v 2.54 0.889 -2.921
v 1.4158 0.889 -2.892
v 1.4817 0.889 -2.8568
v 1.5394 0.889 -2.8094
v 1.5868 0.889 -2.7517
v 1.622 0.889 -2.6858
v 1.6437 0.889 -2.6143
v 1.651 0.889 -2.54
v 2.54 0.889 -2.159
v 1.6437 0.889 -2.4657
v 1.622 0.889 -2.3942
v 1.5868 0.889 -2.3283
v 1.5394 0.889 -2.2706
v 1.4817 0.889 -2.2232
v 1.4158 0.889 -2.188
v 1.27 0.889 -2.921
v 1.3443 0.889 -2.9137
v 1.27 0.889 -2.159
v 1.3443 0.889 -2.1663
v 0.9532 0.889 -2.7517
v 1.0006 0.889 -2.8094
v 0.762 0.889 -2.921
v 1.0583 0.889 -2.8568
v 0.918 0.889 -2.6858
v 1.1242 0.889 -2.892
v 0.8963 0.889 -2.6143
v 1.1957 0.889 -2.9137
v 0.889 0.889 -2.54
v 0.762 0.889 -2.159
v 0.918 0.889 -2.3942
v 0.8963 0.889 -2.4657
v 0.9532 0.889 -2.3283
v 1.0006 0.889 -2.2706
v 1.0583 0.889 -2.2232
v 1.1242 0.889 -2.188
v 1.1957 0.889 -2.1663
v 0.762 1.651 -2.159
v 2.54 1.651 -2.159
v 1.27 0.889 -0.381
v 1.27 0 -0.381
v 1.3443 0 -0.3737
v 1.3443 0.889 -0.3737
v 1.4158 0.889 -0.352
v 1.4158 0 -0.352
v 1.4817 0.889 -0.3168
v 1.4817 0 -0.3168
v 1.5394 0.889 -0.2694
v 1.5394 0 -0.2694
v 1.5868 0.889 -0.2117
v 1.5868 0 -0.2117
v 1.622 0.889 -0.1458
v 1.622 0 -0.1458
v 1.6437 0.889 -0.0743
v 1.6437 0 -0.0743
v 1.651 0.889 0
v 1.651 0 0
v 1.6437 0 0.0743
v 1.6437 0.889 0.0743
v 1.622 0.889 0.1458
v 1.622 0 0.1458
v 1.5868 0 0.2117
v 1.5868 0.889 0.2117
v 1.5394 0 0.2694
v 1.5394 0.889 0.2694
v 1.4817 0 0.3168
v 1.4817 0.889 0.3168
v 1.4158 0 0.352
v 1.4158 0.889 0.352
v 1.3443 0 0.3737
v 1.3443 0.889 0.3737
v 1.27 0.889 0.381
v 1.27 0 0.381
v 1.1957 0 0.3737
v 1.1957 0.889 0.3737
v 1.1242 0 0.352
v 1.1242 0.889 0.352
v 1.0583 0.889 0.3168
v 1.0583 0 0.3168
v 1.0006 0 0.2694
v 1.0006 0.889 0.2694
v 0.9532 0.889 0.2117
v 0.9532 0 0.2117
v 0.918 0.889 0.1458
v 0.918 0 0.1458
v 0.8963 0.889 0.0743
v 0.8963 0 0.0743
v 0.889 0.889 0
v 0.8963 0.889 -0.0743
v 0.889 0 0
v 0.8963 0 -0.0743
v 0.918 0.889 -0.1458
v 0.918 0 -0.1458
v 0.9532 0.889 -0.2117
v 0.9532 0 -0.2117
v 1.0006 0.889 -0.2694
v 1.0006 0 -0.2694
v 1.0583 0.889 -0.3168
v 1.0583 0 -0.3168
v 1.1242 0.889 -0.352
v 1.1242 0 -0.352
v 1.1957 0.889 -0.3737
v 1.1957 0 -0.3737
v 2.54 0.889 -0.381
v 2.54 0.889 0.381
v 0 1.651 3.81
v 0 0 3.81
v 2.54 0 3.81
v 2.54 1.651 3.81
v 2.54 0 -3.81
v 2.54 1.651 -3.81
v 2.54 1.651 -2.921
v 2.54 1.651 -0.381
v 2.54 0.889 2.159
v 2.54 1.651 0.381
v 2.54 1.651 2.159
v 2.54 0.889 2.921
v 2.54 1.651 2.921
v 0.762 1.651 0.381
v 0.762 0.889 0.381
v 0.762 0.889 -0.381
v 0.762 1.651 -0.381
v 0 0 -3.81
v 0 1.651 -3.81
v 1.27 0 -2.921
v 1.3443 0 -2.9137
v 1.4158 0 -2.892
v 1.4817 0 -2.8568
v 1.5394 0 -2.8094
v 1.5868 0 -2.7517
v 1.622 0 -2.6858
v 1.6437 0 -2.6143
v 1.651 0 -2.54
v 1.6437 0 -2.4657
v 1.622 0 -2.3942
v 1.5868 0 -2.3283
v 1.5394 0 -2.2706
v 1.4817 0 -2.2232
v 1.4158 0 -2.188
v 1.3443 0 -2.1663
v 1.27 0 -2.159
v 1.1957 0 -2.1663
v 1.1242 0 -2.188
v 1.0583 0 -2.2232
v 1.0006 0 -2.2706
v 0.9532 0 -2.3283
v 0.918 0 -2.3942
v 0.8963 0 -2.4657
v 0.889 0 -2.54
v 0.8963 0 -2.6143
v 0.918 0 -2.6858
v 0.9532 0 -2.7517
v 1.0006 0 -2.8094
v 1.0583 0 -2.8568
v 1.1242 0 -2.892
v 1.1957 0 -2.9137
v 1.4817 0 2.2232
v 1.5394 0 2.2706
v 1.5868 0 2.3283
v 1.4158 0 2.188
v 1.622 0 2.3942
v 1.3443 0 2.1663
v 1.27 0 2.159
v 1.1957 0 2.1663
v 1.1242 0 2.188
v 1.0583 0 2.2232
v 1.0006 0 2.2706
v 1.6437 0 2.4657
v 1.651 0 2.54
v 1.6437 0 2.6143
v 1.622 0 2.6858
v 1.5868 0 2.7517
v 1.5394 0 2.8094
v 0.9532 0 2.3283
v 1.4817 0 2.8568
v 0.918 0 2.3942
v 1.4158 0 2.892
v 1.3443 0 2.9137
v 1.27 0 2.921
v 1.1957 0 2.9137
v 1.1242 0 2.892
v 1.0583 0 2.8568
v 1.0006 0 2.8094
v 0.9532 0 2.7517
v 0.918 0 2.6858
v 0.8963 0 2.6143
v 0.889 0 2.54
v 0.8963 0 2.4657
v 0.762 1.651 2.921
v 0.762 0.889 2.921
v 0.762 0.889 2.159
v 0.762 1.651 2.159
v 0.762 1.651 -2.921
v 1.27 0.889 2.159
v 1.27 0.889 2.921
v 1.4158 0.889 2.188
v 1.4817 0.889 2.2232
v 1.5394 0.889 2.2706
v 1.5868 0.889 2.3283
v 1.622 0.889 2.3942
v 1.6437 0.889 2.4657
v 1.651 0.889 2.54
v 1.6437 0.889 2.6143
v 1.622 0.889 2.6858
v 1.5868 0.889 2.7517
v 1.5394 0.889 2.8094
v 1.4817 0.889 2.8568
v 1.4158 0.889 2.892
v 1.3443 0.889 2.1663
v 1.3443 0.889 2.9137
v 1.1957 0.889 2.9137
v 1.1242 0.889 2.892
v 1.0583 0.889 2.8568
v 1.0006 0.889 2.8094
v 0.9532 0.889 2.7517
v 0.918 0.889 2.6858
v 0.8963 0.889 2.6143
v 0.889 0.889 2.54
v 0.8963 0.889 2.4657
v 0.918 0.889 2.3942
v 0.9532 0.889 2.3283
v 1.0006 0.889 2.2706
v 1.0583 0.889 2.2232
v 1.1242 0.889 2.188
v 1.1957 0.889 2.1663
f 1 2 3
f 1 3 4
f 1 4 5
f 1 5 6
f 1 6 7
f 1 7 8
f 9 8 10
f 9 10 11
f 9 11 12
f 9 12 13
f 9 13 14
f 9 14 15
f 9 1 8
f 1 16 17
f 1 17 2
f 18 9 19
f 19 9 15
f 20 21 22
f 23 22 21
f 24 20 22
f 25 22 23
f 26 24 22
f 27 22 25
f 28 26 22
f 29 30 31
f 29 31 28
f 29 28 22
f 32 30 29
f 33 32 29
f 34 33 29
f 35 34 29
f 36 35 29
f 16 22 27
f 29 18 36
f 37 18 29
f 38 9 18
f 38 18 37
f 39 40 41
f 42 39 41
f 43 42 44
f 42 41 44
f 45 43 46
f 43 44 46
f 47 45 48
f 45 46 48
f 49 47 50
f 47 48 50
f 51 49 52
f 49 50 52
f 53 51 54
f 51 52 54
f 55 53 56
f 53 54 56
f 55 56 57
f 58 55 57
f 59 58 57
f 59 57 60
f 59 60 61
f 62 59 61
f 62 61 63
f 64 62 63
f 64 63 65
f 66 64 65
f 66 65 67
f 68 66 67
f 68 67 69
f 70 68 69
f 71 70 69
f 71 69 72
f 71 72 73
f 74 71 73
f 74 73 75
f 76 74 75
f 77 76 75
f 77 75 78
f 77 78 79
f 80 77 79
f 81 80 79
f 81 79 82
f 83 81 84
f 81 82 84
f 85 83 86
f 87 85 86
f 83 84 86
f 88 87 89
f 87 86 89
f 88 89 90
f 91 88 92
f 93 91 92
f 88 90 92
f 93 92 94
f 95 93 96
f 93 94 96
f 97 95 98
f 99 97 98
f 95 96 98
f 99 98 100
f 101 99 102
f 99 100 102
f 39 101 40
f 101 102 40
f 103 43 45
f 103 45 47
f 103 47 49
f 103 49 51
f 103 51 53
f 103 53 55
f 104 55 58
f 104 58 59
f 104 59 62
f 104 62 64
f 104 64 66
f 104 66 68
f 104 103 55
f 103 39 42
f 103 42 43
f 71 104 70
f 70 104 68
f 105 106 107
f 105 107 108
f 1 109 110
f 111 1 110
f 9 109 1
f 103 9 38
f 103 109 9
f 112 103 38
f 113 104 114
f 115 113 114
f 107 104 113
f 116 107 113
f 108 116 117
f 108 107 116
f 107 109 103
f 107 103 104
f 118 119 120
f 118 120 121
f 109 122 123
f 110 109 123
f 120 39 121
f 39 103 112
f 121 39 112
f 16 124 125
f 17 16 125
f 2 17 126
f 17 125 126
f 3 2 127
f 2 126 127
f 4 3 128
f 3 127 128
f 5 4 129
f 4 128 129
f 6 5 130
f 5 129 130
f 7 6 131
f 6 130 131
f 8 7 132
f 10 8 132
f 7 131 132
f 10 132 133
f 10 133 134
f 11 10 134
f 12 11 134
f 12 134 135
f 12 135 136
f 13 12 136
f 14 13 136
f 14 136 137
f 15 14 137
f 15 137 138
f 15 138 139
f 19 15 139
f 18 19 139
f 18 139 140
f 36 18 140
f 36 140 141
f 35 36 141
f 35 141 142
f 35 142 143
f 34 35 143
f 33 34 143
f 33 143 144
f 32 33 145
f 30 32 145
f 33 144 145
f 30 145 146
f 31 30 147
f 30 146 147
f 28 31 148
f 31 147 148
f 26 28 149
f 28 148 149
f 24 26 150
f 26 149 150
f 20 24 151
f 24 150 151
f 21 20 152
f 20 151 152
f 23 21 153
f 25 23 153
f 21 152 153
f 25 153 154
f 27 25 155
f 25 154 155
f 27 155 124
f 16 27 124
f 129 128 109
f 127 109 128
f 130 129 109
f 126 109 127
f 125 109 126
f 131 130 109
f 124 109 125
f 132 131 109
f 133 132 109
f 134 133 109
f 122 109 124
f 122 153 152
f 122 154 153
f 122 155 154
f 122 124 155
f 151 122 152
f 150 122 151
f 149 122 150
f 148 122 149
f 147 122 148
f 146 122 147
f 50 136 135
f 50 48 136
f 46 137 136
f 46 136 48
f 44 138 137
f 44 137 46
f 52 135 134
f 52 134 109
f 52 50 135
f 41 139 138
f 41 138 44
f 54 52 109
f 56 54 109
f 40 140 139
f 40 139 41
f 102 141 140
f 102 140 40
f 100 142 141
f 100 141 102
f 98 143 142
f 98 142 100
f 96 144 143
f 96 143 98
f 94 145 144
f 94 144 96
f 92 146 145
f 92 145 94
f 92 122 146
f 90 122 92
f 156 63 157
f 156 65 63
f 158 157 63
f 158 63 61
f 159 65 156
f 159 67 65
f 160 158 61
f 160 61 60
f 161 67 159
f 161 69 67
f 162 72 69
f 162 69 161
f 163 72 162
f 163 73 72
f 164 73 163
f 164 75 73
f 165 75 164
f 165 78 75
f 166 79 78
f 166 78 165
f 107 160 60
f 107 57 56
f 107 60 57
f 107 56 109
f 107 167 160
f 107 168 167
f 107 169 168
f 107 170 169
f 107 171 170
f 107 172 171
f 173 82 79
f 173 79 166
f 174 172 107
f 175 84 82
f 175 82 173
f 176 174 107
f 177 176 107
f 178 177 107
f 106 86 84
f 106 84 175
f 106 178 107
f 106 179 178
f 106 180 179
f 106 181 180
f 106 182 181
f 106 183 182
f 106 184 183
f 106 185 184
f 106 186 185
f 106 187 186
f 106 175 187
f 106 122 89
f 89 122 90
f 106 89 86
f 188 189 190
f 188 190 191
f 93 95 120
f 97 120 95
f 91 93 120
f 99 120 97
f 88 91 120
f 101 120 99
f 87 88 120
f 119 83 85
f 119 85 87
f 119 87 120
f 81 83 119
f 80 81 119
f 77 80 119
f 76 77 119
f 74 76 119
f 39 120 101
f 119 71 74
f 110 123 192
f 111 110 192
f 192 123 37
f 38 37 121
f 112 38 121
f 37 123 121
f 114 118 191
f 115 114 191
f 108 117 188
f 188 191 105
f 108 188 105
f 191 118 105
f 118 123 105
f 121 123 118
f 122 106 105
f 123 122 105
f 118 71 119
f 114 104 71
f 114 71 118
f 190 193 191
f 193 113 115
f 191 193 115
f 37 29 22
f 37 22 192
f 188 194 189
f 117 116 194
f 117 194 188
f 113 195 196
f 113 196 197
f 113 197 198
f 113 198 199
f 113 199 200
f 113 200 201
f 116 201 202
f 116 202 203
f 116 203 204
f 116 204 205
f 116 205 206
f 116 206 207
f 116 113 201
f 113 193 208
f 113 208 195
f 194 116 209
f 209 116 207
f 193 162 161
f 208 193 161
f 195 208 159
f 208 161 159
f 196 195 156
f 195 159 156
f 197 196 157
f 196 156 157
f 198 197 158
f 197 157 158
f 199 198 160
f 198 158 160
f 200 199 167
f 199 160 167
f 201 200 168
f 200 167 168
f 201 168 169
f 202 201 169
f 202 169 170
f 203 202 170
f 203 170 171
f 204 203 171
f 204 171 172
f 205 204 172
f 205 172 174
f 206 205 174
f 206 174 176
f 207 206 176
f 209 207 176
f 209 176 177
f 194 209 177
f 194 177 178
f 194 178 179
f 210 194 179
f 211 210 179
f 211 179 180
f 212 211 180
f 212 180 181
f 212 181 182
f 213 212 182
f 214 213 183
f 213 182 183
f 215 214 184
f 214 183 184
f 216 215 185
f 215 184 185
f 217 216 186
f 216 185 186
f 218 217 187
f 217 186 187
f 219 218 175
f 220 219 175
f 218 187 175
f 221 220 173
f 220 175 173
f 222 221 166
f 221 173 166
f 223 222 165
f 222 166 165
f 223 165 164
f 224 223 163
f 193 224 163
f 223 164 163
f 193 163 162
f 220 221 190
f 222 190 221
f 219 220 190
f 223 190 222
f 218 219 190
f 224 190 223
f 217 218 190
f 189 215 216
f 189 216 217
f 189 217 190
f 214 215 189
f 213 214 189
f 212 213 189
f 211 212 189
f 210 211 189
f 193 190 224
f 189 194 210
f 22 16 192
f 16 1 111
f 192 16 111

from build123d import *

# Parameters (mm, degrees)
SKETCH002_W     = 1.651
SKETCH002_H     = 7.62
PAD_DEPTH       = 2.54
SKETCH003_W     = 0.761982
SKETCH003_H     = 0.762
SKETCH003_W_2   = 0.761985
SKETCH003_W_3   = 0.761994
POCKET_DEPTH    = 1.778
SKETCH004_R     = 0.381
POCKET001_DEPTH = 1.652


with BuildPart() as part:
    # Sketch002 → Pad (new body)
    with BuildSketch(Plane.YZ):
        with Locations((0.8255, 0)):
            Rectangle(SKETCH002_W, SKETCH002_H)
    extrude(amount=PAD_DEPTH)

    # Sketch003 (on Face6 of Pad) → Pocket (cut)
    with BuildSketch(Plane.YZ.offset(2.54)):
        with Locations((1.27001, 2.54)):
            Rectangle(SKETCH003_W, SKETCH003_H)
        with Locations((1.270008, 0)):
            Rectangle(SKETCH003_W_2, SKETCH003_H)
        with Locations((1.270004, -2.54)):
            Rectangle(SKETCH003_W_3, SKETCH003_H)
    extrude(amount=-POCKET_DEPTH, mode=Mode.SUBTRACT)

    # Sketch004 (on Face2 of Pocket) → Pocket001 (cut, through all)
    with BuildSketch(Plane(origin=(0, 0, 0), x_dir=(0, 0, -1), z_dir=(0, -1, 0))):
        with Locations((0, 1.27)):
            Circle(SKETCH004_R)
        with Locations((-2.54, 1.27)):
            Circle(SKETCH004_R)
        with Locations((2.54, 1.27)):
            Circle(SKETCH004_R)
    extrude(amount=-POCKET001_DEPTH, mode=Mode.SUBTRACT)


solid = part.part
